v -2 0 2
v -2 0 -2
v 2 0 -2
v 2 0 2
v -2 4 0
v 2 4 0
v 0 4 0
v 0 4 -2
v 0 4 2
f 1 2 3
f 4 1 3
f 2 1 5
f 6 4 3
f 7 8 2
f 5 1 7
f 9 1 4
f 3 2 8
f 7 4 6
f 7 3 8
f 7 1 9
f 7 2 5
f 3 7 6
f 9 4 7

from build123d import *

# Parameters (mm, degrees)
SKETCH1_W           = 4
SKETCH1_H           = 4
BOSS_EXTRUDE1_DEPTH = 4
CUT_EXTRUDE5_DEPTH  = 32
CUT_EXTRUDE6_DEPTH  = 32
CUT_EXTRUDE7_DEPTH  = 32
CUT_EXTRUDE8_DEPTH  = 32


with BuildPart() as part:
    # Sketch1 → Boss-Extrude1 (new body)
    with BuildSketch(Plane(origin=(0, 0, 0), x_dir=(1, 0, 0), z_dir=(0, 1, 0))):
        Rectangle(SKETCH1_W, SKETCH1_H)
    extrude(amount=BOSS_EXTRUDE1_DEPTH)

    # 3DSketch3 → Cut-Extrude5 (cut, along a direction that is not the sketch's normal)
    with BuildSketch(Plane(origin=(0, 4, 0), x_dir=(-0.4082482904638629, -0.8164965809277258, 0.40824829046386363), z_dir=(-0.894427190999916, 0.447213595499958, 0))):
        Polygon((0, 0), (0.816496581, 1.825741858), (4.898979486, 0), align=None)
    extrude(amount=CUT_EXTRUDE5_DEPTH, dir=(-1, 0, 0), mode=Mode.SUBTRACT)

    # 3DSketch4 → Cut-Extrude6 (cut, along a direction that is not the sketch's normal)
    with BuildSketch(Plane(origin=(0, 4, 0), x_dir=(-0.4082482904638631, -0.8164965809277261, -0.4082482904638631), z_dir=(0, 0.447213595499958, -0.894427190999916))):
        Polygon((0, 0), (0.816496581, 1.825741858), (4.898979486, 0), align=None)
    extrude(amount=CUT_EXTRUDE6_DEPTH, dir=(0, 1, 0), mode=Mode.SUBTRACT)

    # 3DSketch5 → Cut-Extrude7 (cut, along a direction that is not the sketch's normal)
    with BuildSketch(Plane(origin=(0, 4, 0), x_dir=(-0.4082482904638631, -0.816496580927726, -0.4082482904638631), z_dir=(0.894427190999916, -0.447213595499958, 0))):
        Polygon((0, 0), (4.898979486, 0), (0.816496581, 1.825741858), align=None)
    extrude(amount=-CUT_EXTRUDE7_DEPTH, dir=(1, 0, 0), mode=Mode.SUBTRACT)

    # 3DSketch6 → Cut-Extrude8 (cut, along a direction that is not the sketch's normal)
    with BuildSketch(Plane(origin=(2, 0, 2), x_dir=(-0.3333333333333332, 0.6666666666666664, -0.666666666666667), z_dir=(0.894427190999916, 0.447213595499958, 0))):
        Polygon((3.333333333, 2.98142397), (0, 0), (4.666666667, 1.490711985), align=None)
        Polygon((6, 0), (4.666666667, 1.490711985), (2.666666667, -2.98142397), align=None)
    extrude(amount=CUT_EXTRUDE8_DEPTH, dir=(1, 0, 0), mode=Mode.SUBTRACT)


solid = part.part
